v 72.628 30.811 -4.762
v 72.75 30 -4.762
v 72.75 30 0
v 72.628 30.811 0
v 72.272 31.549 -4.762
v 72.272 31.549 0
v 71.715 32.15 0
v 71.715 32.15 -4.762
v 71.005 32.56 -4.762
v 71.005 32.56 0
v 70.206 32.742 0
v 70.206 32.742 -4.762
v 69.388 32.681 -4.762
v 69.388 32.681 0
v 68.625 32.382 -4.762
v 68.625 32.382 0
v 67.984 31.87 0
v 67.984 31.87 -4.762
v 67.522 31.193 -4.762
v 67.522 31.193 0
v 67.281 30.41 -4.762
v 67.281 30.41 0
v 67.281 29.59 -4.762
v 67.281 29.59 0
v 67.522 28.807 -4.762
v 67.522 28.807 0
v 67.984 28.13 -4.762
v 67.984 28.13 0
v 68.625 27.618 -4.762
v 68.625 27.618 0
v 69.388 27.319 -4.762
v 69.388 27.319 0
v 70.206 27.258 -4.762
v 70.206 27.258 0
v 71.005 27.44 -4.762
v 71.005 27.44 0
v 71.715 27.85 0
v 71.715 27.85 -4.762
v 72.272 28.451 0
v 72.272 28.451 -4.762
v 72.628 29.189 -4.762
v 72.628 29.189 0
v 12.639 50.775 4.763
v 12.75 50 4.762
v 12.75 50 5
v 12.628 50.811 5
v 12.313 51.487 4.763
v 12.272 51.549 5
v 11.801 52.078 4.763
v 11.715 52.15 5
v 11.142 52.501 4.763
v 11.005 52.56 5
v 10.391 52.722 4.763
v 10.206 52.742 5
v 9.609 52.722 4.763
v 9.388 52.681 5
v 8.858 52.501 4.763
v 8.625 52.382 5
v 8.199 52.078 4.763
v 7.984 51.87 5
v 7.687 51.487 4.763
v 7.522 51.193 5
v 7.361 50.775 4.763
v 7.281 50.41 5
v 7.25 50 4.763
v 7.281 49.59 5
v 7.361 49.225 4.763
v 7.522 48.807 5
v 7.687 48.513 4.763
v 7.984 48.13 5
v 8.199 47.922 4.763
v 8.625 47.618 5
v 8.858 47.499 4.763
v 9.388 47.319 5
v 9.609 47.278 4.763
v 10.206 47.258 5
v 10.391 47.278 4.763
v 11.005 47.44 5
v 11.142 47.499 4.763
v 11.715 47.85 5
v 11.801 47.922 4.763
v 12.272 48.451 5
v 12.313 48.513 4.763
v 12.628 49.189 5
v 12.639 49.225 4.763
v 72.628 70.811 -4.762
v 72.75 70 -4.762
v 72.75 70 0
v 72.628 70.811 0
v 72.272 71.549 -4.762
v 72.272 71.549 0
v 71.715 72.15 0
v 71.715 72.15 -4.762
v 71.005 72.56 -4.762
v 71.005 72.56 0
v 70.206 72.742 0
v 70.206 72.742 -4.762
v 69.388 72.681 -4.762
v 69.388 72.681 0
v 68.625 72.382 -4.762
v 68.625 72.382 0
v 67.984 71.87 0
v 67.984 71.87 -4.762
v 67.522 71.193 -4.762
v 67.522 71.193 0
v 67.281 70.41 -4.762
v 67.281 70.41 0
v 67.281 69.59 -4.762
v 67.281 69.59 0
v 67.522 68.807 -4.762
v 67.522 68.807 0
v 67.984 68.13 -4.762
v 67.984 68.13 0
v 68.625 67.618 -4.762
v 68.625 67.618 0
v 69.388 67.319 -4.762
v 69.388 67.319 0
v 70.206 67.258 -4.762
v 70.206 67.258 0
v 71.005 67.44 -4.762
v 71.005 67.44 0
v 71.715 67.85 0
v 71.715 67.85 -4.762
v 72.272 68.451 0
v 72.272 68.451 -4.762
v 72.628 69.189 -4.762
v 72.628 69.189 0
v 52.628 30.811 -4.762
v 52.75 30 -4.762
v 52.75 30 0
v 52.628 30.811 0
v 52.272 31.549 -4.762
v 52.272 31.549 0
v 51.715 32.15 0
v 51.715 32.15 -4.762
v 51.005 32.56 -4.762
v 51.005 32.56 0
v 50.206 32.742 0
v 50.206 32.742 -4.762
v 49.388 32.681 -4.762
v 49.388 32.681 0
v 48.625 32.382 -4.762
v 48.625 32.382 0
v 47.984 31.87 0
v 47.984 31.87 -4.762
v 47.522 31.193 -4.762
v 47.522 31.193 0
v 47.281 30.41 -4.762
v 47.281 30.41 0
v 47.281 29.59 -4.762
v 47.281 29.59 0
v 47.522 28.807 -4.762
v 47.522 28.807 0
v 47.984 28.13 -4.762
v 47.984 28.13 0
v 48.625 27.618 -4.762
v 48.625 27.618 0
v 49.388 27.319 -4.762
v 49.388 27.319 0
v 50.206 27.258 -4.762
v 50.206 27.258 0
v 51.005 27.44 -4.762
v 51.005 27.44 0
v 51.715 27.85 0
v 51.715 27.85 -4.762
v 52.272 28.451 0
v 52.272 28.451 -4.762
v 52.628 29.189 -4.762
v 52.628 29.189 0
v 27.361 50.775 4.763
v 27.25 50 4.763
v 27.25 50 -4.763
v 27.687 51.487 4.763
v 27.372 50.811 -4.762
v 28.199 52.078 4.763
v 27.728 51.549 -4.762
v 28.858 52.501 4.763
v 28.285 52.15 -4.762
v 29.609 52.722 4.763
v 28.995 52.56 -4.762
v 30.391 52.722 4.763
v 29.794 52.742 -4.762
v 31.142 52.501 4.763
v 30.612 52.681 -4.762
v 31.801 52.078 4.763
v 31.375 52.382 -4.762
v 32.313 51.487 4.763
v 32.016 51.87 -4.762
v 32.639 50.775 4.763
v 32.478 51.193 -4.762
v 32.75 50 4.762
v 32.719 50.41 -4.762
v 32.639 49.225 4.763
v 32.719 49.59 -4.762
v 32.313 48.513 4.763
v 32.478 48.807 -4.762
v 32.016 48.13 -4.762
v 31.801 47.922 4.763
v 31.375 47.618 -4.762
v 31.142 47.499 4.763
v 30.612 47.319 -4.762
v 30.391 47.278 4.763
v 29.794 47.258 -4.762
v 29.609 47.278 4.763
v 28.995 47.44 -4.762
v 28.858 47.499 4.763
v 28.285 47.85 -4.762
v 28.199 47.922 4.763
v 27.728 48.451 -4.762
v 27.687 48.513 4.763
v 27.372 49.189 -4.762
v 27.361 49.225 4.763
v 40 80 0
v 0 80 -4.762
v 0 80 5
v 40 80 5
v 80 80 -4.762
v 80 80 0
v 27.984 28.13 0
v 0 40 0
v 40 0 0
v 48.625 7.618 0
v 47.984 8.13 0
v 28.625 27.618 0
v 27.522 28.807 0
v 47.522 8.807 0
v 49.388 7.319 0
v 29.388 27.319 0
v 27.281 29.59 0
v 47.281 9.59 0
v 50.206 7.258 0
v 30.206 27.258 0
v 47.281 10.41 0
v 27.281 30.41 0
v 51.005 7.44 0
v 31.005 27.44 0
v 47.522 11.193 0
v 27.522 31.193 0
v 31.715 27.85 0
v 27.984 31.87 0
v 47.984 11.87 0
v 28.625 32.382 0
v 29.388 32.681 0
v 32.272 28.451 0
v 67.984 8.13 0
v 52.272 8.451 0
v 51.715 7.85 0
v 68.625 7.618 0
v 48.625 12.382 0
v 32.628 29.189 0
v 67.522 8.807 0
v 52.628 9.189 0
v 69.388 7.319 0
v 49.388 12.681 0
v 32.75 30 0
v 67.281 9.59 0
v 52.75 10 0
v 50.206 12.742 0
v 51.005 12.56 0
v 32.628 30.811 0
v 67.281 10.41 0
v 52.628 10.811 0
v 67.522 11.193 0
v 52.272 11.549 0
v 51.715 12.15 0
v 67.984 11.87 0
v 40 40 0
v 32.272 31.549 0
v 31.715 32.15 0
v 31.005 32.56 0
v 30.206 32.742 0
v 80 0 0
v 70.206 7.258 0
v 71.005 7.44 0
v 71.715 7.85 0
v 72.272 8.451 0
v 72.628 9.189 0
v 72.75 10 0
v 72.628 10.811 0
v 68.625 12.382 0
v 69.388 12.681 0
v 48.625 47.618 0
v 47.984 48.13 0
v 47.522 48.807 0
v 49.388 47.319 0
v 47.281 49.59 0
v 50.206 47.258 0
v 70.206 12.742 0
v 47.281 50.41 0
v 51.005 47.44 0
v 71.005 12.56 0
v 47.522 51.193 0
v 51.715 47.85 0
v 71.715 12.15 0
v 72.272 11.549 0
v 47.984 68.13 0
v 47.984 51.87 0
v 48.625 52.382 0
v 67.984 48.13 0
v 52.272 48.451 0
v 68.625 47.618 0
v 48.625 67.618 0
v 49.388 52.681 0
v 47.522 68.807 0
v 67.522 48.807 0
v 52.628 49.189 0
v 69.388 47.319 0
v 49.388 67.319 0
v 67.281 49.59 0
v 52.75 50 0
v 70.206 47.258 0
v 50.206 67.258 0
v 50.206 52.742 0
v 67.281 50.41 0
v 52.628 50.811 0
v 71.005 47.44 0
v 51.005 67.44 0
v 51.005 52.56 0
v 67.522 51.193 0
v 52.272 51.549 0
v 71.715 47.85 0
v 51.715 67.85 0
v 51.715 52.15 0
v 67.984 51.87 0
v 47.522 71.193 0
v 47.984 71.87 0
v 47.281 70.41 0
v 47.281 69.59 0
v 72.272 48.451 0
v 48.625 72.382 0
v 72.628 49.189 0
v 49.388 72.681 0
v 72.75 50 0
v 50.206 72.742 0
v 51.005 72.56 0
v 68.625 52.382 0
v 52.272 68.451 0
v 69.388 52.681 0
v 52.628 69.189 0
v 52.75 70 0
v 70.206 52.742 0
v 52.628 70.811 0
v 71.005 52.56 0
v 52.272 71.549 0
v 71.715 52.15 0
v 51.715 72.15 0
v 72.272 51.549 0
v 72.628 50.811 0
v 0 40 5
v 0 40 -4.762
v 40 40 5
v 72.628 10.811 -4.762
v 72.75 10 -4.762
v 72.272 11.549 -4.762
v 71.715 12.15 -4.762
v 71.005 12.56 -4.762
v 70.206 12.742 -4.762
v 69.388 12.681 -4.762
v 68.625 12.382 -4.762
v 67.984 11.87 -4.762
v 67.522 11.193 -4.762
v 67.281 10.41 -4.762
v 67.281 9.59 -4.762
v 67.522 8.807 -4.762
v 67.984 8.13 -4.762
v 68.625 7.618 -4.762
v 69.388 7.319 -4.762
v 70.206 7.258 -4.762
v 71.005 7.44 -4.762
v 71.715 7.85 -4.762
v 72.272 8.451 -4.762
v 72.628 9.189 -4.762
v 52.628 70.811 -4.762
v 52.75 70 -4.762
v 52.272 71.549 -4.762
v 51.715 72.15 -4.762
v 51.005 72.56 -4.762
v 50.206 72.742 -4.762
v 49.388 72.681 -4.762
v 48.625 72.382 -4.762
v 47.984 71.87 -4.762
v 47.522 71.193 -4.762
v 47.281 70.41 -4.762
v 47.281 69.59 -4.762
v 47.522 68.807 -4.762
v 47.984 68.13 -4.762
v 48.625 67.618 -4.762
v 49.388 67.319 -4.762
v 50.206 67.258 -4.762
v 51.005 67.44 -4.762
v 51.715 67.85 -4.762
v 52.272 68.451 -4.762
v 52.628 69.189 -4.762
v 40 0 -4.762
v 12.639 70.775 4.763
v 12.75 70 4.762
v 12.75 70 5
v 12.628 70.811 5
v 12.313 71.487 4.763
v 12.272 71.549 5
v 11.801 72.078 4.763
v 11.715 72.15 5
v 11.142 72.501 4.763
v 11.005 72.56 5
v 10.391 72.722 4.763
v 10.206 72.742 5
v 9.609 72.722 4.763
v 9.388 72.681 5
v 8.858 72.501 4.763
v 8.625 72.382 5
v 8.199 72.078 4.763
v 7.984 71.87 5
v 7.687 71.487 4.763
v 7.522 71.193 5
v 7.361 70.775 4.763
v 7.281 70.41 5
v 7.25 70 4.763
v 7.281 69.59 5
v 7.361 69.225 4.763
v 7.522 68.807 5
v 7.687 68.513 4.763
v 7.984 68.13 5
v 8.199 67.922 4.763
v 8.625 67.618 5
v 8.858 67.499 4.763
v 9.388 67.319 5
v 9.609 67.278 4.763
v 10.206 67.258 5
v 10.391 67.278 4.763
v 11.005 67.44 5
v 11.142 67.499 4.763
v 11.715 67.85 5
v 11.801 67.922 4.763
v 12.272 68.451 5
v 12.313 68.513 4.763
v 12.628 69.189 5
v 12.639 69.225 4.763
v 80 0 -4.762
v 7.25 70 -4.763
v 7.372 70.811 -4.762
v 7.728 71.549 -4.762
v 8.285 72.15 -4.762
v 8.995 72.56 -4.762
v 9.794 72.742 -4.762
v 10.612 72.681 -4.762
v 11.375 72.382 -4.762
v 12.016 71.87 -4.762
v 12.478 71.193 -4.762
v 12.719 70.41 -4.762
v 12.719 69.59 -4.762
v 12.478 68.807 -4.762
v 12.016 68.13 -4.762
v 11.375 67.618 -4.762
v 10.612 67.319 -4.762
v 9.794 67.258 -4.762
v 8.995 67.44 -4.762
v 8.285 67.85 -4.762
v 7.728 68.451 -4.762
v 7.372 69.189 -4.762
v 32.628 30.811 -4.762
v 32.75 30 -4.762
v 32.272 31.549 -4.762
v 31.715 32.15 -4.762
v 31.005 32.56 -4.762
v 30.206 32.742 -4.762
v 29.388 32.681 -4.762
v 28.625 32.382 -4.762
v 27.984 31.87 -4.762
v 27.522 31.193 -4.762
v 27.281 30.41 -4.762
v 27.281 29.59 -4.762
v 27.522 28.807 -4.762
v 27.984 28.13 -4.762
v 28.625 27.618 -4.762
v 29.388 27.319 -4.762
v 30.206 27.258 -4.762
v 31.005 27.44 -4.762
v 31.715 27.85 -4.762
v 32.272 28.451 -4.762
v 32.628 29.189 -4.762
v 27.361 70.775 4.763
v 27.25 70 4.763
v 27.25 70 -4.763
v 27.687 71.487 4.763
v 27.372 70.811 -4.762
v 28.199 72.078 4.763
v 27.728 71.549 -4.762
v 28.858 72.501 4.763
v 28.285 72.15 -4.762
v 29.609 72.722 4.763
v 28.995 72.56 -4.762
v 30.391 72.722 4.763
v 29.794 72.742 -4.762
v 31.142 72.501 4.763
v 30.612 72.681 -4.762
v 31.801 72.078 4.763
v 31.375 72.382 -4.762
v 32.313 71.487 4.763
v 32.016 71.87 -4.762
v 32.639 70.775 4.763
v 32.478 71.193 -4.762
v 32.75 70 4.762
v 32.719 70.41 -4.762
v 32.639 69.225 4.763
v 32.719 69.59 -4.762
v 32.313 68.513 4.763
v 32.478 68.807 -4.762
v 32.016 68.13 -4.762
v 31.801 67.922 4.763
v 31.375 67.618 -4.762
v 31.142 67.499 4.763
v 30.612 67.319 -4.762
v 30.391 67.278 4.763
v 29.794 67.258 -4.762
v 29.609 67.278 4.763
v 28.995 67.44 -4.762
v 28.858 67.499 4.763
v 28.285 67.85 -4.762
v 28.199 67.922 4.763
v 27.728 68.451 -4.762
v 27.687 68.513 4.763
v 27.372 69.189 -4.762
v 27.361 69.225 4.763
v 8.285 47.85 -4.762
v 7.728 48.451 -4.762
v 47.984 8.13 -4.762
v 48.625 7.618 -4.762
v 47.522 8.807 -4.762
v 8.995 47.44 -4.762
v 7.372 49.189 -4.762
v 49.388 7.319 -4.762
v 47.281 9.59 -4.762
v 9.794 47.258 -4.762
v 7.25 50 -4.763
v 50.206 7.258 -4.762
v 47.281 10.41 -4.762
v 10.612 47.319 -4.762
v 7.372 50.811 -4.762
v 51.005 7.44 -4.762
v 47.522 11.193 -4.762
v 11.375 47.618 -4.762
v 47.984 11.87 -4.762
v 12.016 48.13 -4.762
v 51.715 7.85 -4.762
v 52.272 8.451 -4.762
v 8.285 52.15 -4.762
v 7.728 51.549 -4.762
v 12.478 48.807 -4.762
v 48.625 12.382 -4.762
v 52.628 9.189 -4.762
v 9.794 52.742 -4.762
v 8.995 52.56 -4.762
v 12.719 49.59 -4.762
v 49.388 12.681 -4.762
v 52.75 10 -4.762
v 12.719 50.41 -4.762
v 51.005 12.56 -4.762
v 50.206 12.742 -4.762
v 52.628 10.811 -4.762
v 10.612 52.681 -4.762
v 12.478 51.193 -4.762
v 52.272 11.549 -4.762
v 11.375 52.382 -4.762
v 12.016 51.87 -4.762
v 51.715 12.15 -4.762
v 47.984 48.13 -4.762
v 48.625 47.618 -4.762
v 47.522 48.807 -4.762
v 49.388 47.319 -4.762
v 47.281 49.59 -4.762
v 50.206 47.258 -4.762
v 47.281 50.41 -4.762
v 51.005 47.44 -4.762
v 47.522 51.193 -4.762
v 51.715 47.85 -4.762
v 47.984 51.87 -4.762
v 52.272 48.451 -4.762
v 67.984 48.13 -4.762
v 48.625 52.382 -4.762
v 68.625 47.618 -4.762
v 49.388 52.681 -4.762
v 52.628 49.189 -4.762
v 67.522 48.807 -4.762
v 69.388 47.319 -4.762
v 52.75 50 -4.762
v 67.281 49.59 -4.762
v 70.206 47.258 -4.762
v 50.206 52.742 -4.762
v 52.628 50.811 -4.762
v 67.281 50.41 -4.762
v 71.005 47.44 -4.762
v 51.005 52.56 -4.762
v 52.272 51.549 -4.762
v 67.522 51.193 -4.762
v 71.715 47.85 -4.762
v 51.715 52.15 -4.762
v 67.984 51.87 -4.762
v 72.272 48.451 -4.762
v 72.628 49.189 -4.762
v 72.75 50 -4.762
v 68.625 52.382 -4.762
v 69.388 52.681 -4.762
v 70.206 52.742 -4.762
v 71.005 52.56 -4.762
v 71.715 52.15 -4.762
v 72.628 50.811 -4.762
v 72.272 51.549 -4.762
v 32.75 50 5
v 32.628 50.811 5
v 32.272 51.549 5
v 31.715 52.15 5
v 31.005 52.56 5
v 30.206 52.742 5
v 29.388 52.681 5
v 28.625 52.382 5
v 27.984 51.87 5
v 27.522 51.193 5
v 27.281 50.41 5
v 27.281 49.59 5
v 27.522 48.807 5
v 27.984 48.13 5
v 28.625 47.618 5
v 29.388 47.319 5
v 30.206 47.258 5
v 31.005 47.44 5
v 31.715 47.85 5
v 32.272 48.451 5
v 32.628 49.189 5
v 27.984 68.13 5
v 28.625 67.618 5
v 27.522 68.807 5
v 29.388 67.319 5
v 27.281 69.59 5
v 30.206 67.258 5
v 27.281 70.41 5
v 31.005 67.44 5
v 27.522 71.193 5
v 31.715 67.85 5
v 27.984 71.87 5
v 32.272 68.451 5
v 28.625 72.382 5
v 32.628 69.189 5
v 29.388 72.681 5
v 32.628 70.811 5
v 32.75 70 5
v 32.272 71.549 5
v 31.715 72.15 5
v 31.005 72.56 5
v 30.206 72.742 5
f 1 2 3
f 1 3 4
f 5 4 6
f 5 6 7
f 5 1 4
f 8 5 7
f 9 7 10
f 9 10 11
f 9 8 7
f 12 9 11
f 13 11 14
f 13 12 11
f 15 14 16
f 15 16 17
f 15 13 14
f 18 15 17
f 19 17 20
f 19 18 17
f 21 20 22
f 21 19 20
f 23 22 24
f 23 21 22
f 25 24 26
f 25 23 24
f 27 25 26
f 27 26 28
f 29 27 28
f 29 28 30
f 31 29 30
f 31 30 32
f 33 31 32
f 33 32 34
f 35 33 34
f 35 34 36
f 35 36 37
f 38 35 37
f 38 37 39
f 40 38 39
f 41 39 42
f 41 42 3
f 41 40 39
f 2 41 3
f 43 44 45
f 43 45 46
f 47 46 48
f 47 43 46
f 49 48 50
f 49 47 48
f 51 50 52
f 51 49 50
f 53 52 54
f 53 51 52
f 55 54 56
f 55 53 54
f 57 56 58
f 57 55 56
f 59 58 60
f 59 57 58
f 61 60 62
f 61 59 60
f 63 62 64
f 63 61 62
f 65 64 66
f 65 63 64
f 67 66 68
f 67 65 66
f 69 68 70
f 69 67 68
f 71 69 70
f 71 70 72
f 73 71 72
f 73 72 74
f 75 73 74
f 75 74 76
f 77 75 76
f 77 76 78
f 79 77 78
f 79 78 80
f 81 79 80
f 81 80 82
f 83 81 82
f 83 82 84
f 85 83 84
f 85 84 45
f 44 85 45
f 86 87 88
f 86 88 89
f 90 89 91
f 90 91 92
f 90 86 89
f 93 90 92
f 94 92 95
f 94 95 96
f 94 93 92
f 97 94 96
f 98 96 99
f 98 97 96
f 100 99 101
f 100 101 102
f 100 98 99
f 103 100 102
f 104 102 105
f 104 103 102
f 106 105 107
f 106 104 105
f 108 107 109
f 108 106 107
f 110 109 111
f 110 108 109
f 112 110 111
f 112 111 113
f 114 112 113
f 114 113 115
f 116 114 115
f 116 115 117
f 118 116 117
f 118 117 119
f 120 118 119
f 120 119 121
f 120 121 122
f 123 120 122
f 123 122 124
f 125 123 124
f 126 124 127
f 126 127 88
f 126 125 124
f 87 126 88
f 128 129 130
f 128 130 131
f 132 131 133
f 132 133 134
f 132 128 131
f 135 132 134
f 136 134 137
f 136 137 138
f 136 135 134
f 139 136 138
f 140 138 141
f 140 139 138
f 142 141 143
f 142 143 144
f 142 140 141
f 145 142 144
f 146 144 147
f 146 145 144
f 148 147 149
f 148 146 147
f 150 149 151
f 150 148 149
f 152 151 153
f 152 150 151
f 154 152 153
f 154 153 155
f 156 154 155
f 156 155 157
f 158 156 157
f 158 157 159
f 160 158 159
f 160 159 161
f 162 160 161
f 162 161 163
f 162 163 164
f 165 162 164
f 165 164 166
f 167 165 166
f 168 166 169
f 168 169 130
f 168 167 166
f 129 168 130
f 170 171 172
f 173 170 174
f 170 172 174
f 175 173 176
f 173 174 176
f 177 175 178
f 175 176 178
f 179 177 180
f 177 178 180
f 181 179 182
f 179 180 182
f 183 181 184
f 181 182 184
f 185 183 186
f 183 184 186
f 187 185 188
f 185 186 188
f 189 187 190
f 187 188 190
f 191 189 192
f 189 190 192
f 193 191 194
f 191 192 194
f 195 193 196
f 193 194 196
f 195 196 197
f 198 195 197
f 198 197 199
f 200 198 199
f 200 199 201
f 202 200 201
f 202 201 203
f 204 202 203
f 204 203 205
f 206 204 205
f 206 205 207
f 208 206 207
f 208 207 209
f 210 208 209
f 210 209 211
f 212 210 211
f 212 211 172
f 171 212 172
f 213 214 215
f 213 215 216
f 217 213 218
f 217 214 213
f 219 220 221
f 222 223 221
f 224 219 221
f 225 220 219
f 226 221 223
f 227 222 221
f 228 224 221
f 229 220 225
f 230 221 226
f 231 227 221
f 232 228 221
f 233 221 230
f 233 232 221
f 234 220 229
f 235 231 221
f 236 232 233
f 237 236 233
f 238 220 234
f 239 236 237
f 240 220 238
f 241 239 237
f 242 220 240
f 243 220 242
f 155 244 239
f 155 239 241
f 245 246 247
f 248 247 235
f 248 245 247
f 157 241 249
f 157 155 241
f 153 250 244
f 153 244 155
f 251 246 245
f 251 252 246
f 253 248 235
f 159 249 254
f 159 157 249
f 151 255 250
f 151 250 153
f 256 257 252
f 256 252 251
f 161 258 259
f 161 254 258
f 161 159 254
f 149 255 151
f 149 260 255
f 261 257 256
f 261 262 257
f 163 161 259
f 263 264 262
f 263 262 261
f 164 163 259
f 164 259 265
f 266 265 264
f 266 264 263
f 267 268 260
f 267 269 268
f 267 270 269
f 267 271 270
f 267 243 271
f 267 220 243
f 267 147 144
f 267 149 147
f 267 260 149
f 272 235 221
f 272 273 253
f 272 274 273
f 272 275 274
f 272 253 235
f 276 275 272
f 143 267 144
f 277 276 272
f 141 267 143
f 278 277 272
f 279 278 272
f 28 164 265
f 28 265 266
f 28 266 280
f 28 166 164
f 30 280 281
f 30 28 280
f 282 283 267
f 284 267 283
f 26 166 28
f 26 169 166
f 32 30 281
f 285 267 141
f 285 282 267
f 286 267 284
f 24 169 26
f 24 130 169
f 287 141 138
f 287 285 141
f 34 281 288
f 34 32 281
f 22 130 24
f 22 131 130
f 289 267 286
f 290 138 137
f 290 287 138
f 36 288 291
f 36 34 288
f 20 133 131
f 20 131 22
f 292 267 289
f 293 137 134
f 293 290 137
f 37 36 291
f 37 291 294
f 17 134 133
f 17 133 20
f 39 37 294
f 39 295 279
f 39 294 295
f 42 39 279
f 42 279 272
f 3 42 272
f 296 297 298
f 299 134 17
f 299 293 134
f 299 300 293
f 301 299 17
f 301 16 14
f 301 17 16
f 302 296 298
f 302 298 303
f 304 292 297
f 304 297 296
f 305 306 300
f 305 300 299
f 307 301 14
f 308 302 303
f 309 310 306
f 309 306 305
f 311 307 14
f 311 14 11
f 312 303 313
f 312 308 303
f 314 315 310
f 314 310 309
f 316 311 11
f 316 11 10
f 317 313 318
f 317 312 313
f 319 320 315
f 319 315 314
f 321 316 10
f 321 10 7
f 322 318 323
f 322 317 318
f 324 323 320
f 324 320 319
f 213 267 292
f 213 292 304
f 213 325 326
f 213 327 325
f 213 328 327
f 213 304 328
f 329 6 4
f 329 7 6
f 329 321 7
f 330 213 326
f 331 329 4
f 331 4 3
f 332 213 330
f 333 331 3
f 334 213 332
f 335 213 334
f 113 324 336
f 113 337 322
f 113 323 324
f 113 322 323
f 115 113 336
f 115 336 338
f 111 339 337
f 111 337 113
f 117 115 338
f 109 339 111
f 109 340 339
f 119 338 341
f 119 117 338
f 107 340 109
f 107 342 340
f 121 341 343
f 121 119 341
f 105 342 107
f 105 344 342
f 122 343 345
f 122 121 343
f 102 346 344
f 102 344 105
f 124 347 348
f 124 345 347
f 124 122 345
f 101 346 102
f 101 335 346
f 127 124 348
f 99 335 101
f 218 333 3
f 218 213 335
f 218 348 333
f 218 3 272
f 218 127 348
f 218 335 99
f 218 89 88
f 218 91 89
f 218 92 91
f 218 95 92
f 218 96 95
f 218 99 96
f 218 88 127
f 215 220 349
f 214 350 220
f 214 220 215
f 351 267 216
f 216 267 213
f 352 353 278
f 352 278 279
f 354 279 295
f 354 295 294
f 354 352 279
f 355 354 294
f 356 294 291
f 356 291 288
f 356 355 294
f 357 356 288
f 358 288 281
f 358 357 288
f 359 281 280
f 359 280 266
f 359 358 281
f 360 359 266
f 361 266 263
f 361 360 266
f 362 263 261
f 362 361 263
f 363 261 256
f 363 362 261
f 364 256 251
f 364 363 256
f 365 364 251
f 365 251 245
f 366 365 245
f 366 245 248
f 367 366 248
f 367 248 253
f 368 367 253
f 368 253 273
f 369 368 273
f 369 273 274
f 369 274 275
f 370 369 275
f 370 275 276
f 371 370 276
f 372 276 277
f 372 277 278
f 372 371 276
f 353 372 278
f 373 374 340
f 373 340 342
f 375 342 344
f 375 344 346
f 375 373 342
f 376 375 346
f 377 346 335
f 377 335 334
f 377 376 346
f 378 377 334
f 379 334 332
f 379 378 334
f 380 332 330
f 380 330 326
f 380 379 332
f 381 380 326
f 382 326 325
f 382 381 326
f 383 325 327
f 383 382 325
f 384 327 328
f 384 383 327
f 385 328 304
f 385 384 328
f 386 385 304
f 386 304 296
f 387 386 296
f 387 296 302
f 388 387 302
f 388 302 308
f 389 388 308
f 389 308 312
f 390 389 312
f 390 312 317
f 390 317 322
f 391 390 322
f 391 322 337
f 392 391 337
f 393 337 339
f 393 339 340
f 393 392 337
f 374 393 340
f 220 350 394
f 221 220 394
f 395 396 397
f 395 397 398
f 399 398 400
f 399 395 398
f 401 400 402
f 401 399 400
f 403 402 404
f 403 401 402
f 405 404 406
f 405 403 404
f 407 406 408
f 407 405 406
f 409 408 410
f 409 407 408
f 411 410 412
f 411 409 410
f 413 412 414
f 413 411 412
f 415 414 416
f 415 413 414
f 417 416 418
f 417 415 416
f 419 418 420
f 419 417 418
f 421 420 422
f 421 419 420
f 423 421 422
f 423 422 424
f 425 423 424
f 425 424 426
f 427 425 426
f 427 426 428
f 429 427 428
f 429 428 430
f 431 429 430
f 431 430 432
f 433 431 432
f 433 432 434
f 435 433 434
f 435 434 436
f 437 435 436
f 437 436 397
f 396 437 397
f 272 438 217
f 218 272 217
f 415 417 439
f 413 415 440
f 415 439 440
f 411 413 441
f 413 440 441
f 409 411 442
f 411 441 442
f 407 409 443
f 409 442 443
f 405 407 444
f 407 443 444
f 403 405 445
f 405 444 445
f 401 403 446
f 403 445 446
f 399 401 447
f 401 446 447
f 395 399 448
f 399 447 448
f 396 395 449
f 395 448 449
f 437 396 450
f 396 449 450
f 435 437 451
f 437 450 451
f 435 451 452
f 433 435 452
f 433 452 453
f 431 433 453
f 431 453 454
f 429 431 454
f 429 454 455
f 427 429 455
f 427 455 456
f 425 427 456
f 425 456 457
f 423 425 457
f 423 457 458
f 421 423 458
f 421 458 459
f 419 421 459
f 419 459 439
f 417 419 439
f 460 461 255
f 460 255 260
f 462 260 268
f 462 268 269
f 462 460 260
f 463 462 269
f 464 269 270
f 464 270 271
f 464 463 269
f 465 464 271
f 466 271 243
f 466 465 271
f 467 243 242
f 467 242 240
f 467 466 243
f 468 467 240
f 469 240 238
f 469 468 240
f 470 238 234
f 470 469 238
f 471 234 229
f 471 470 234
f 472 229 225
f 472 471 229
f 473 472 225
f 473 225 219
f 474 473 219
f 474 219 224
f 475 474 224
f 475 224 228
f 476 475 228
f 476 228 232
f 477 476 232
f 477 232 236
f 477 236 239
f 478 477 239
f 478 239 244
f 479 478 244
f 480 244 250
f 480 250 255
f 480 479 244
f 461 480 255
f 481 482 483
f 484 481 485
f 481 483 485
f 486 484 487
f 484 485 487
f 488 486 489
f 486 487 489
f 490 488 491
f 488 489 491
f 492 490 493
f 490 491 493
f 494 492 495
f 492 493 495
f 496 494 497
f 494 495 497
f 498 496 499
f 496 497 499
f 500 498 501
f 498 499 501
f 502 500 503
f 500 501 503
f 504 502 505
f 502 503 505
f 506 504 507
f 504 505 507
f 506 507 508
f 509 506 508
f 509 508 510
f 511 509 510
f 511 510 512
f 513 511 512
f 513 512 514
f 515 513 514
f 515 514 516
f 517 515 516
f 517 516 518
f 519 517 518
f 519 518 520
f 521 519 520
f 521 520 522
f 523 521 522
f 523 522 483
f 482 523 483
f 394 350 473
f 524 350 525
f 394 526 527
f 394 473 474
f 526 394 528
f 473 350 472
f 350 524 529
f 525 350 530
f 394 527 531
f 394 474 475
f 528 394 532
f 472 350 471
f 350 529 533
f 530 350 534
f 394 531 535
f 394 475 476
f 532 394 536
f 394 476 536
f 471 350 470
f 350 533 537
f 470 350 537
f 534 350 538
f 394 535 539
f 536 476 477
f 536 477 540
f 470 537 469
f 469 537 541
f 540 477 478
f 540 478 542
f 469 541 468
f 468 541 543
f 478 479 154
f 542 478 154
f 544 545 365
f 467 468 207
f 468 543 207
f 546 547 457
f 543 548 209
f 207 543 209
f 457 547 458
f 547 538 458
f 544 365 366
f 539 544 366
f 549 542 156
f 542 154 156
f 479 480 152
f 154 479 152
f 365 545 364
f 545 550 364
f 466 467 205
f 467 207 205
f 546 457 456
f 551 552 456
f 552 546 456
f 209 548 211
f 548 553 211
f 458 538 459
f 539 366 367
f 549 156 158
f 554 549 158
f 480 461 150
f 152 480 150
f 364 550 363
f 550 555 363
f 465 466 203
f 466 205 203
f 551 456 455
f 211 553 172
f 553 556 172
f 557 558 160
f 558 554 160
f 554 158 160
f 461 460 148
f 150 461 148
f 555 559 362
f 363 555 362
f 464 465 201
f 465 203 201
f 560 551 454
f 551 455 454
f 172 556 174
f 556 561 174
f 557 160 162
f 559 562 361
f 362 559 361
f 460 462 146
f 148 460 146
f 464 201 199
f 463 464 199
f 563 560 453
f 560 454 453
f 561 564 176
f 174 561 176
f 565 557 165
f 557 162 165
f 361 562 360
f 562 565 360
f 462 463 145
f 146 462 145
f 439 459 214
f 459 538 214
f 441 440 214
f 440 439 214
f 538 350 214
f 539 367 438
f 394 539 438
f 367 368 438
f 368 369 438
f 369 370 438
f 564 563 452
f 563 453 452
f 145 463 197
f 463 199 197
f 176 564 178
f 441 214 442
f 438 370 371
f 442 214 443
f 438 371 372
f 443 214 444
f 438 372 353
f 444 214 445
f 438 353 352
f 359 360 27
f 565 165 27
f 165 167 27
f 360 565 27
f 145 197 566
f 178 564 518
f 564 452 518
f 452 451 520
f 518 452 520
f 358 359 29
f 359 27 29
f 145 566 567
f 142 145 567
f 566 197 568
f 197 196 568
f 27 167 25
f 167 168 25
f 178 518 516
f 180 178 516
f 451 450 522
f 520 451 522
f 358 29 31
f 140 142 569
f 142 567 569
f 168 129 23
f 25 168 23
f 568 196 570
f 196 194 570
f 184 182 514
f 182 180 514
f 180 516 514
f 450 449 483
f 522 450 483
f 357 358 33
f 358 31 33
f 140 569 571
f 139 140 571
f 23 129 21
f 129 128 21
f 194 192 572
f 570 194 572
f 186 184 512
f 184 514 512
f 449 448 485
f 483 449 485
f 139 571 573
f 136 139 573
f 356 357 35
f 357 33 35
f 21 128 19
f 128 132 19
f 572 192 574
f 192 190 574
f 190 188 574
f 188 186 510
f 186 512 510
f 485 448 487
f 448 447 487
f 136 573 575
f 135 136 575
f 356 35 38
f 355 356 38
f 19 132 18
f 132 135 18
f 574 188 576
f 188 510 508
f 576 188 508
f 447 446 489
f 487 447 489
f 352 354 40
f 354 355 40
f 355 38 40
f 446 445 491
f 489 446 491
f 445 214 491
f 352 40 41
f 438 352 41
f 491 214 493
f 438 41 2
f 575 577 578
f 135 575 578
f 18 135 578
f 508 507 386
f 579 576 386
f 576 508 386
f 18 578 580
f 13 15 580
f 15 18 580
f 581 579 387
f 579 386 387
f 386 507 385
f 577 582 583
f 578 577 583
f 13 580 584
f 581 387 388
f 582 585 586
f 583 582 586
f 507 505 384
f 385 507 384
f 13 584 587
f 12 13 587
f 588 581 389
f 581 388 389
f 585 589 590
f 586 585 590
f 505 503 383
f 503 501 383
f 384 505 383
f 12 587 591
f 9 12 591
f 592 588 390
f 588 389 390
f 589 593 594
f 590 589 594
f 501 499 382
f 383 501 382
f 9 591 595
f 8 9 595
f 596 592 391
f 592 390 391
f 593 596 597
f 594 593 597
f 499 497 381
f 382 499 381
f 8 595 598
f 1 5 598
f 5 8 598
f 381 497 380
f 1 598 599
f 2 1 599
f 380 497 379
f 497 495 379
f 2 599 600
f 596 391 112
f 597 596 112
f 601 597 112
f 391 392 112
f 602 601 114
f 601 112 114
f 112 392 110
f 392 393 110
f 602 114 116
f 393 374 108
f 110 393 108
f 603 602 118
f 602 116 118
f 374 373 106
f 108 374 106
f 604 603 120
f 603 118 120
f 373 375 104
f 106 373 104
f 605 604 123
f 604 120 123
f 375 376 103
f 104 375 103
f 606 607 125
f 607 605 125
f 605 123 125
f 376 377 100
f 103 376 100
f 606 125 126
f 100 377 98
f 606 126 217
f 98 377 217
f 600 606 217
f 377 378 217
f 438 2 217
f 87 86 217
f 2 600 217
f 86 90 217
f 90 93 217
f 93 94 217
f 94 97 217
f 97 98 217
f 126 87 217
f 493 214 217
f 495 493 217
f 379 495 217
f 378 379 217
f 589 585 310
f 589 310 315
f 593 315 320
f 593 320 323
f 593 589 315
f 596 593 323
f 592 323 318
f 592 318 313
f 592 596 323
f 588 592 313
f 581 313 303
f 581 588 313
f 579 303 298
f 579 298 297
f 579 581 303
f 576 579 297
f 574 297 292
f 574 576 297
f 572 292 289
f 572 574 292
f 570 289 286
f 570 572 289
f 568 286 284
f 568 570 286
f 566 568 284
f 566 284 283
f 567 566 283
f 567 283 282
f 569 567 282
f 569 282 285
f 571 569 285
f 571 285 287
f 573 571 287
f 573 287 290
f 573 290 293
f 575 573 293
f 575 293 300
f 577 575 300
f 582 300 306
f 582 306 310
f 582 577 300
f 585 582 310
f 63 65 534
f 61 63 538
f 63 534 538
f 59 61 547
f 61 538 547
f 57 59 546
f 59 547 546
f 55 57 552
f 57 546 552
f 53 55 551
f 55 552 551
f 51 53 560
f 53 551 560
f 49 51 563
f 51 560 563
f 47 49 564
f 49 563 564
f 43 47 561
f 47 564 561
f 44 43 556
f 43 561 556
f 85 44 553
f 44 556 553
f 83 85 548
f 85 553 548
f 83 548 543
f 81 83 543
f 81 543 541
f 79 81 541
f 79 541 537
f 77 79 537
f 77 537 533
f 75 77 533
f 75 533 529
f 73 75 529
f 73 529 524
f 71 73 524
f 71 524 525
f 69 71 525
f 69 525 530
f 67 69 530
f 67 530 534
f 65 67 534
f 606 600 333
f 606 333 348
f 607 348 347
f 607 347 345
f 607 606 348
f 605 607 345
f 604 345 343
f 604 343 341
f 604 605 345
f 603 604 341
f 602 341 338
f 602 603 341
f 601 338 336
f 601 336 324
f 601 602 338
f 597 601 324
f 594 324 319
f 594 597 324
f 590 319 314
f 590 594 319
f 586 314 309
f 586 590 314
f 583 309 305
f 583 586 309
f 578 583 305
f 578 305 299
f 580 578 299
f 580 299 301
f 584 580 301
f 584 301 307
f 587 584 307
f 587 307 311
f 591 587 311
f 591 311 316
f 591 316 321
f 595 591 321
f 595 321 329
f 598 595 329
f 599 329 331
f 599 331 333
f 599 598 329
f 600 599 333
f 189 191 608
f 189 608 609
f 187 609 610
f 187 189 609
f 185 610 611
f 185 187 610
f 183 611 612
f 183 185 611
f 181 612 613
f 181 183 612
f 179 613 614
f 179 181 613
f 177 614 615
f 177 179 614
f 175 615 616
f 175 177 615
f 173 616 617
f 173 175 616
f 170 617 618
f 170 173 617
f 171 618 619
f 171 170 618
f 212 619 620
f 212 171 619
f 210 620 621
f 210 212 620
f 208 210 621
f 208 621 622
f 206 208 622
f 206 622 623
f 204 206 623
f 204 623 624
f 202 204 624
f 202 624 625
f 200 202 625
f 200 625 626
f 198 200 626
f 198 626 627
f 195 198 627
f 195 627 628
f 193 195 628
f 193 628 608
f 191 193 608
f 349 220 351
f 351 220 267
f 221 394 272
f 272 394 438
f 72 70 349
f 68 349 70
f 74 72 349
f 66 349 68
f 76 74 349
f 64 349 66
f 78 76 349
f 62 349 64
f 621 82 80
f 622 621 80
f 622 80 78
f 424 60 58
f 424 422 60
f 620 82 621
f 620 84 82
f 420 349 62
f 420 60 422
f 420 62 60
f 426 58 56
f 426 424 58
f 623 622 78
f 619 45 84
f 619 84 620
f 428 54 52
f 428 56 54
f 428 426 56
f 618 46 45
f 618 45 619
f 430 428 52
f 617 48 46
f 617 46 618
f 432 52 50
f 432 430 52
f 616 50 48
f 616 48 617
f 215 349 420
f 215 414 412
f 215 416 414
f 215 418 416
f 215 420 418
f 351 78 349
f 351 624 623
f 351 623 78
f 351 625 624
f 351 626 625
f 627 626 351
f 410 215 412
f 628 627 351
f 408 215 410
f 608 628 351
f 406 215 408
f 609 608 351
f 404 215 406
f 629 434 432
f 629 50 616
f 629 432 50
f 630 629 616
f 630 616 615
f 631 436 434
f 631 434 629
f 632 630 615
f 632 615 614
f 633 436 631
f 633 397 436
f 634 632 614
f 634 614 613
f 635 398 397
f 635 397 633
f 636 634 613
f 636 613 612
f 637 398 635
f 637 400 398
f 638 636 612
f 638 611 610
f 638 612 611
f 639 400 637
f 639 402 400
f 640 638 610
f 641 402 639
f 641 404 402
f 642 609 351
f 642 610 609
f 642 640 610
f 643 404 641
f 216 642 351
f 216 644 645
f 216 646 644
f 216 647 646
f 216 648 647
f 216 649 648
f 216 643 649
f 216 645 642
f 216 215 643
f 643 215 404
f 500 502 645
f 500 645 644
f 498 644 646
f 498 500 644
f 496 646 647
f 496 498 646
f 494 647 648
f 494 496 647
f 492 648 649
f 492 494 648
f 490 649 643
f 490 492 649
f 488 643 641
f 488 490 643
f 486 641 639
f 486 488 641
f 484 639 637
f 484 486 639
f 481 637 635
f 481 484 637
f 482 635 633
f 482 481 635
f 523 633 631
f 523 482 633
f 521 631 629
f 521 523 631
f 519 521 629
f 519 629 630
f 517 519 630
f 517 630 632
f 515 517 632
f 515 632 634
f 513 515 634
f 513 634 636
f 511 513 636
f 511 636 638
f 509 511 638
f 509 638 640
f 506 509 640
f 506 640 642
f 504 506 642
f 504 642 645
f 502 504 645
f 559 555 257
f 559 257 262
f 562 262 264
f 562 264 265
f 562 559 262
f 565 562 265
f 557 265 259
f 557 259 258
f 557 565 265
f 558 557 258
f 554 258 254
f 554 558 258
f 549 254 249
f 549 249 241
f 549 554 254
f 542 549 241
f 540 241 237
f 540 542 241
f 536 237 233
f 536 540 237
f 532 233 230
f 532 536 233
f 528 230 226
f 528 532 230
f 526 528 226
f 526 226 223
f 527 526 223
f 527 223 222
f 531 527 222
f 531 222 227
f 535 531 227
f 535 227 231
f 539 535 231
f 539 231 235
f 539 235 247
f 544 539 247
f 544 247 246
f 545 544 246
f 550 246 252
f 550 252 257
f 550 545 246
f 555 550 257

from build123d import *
from build123d.topology import SkipClean

# Parameters (mm, degrees)
SKETCH1_W                   = 40
SKETCH1_H                   = 40
BOSS_EXTRUDE1_DEPTH         = 4.7625
SKETCH1_3_W                 = 40
SKETCH1_3_H                 = 40
BOSS_EXTRUDE2_DEPTH         = 5
M5_CLEARANCE_HOLE1_D        = 5.5
BODY_MOVE_COPY1_OUTLINE_R   = 2.75
BODY_MOVE_COPY1_DEPTH       = 4.7625
BODY_MOVE_COPY1_START       = -5
BODY_MOVE_COPY1_2_OUTLINE_W = 40
BODY_MOVE_COPY1_2_OUTLINE_H = 40
BODY_MOVE_COPY1_2_OUTLINE_R = 2.75
BODY_MOVE_COPY1_2_DEPTH     = 0.2375
BODY_MOVE_COPY1_START_2     = -4.7625
BODY_MOVE_COPY1_3_OUTLINE_R = 2.75
BODY_MOVE_COPY1_3_DEPTH     = 4.7625
BODY_MOVE_COPY1_START_3     = 4.7625
BODY_MOVE_COPY1_4_OUTLINE_W = 40
BODY_MOVE_COPY1_4_OUTLINE_H = 40
BODY_MOVE_COPY1_4_OUTLINE_R = 2.75
BODY_MOVE_COPY1_4_DEPTH     = 0.2375


# Read off the part's stored shape, not the designer's step: Body-Move/Copy1
with BuildPart() as part:
    # Sketch1 → Boss-Extrude1 (new body)
    with BuildSketch(Plane.XY):
        with Locations((20, 60)):
            Rectangle(SKETCH1_W, SKETCH1_H)
        with Locations((60, 60)):
            Rectangle(SKETCH1_W, SKETCH1_H)
        with Locations((60, 20)):
            Rectangle(SKETCH1_W, SKETCH1_H)
        Polygon((40, 40), (0, 40), (40, 0), align=None)
    extrude(amount=BOSS_EXTRUDE1_DEPTH)

    # Sketch1<3> → Boss-Extrude2 (add)
    with BuildSketch(Plane.XY):
        with Locations((20, 60)):
            Rectangle(SKETCH1_3_W, SKETCH1_3_H)
    extrude(amount=-BOSS_EXTRUDE2_DEPTH)

    # M5 Clearance Hole1 (through all)
    with Locations(Plane.XY.offset(4.7625)):
        with Locations((10, 70), (30, 70), (50, 70), (70, 70), (30, 50), (50, 50), (70, 50), (30, 30), (50, 30), (70, 30), (50, 10), (70, 10), (10, 50)):
            Hole(M5_CLEARANCE_HOLE1_D / 2)

    # Body-Move/Copy1 outline → Body-Move/Copy1 (cut)
    with BuildSketch(Plane.XY):
        Polygon((40, 0), (80, 0), (80, 80), (40, 80), (40, 40), (0, 40), align=None)
        with Locations((30, 30)):
            Circle(BODY_MOVE_COPY1_OUTLINE_R, mode=Mode.SUBTRACT)
        with Locations((50, 10)):
            Circle(BODY_MOVE_COPY1_OUTLINE_R, mode=Mode.SUBTRACT)
        with Locations((70, 10)):
            Circle(BODY_MOVE_COPY1_OUTLINE_R, mode=Mode.SUBTRACT)
        with Locations((50, 30)):
            Circle(BODY_MOVE_COPY1_OUTLINE_R, mode=Mode.SUBTRACT)
        with Locations((70, 30)):
            Circle(BODY_MOVE_COPY1_OUTLINE_R, mode=Mode.SUBTRACT)
        with Locations((50, 50)):
            Circle(BODY_MOVE_COPY1_OUTLINE_R, mode=Mode.SUBTRACT)
        with Locations((70, 50)):
            Circle(BODY_MOVE_COPY1_OUTLINE_R, mode=Mode.SUBTRACT)
        with Locations((50, 70)):
            Circle(BODY_MOVE_COPY1_OUTLINE_R, mode=Mode.SUBTRACT)
        with Locations((70, 70)):
            Circle(BODY_MOVE_COPY1_OUTLINE_R, mode=Mode.SUBTRACT)
    extrude(amount=BODY_MOVE_COPY1_DEPTH, mode=Mode.SUBTRACT)

    # Body-Move_Copy1 2 outline → Body-Move_Copy1 2 (cut)
    with BuildSketch(Plane.XY.offset(BODY_MOVE_COPY1_START)):
        with Locations((20, 60)):
            Rectangle(BODY_MOVE_COPY1_2_OUTLINE_W, BODY_MOVE_COPY1_2_OUTLINE_H)
        with Locations((10, 50)):
            Circle(BODY_MOVE_COPY1_2_OUTLINE_R, mode=Mode.SUBTRACT)
        with Locations((30, 50)):
            Circle(BODY_MOVE_COPY1_2_OUTLINE_R, mode=Mode.SUBTRACT)
        with Locations((10, 70)):
            Circle(BODY_MOVE_COPY1_2_OUTLINE_R, mode=Mode.SUBTRACT)
        with Locations((30, 70)):
            Circle(BODY_MOVE_COPY1_2_OUTLINE_R, mode=Mode.SUBTRACT)
    extrude(amount=BODY_MOVE_COPY1_2_DEPTH, mode=Mode.SUBTRACT)

    # Body-Move_Copy1 3 outline → Body-Move_Copy1 3 (add)
    with BuildSketch(Plane.XY.offset(BODY_MOVE_COPY1_START_2)):
        Polygon((40, 0), (80, 0), (80, 80), (40, 80), (40, 40), (0, 40), align=None)
        with Locations((30, 30)):
            Circle(BODY_MOVE_COPY1_3_OUTLINE_R, mode=Mode.SUBTRACT)
        with Locations((50, 10)):
            Circle(BODY_MOVE_COPY1_3_OUTLINE_R, mode=Mode.SUBTRACT)
        with Locations((70, 10)):
            Circle(BODY_MOVE_COPY1_3_OUTLINE_R, mode=Mode.SUBTRACT)
        with Locations((50, 30)):
            Circle(BODY_MOVE_COPY1_3_OUTLINE_R, mode=Mode.SUBTRACT)
        with Locations((70, 30)):
            Circle(BODY_MOVE_COPY1_3_OUTLINE_R, mode=Mode.SUBTRACT)
        with Locations((50, 50)):
            Circle(BODY_MOVE_COPY1_3_OUTLINE_R, mode=Mode.SUBTRACT)
        with Locations((70, 50)):
            Circle(BODY_MOVE_COPY1_3_OUTLINE_R, mode=Mode.SUBTRACT)
        with Locations((50, 70)):
            Circle(BODY_MOVE_COPY1_3_OUTLINE_R, mode=Mode.SUBTRACT)
        with Locations((70, 70)):
            Circle(BODY_MOVE_COPY1_3_OUTLINE_R, mode=Mode.SUBTRACT)
    extrude(amount=BODY_MOVE_COPY1_3_DEPTH)

    # Body-Move_Copy1 4 outline → Body-Move_Copy1 4 (add)
    with SkipClean():  # the faces are left unmerged after this step: merging them gives an invalid solid
        with BuildSketch(Plane.XY.offset(BODY_MOVE_COPY1_START_3)):
            with Locations((20, 60)):
                Rectangle(BODY_MOVE_COPY1_4_OUTLINE_W, BODY_MOVE_COPY1_4_OUTLINE_H)
            with Locations((10, 50)):
                Circle(BODY_MOVE_COPY1_4_OUTLINE_R, mode=Mode.SUBTRACT)
            with Locations((30, 50)):
                Circle(BODY_MOVE_COPY1_4_OUTLINE_R, mode=Mode.SUBTRACT)
            with Locations((10, 70)):
                Circle(BODY_MOVE_COPY1_4_OUTLINE_R, mode=Mode.SUBTRACT)
            with Locations((30, 70)):
                Circle(BODY_MOVE_COPY1_4_OUTLINE_R, mode=Mode.SUBTRACT)
        extrude(amount=BODY_MOVE_COPY1_4_DEPTH)
    add(part.part.scale(1), mode=Mode.REPLACE)  # the faces are merged on a copy


solid = part.part
